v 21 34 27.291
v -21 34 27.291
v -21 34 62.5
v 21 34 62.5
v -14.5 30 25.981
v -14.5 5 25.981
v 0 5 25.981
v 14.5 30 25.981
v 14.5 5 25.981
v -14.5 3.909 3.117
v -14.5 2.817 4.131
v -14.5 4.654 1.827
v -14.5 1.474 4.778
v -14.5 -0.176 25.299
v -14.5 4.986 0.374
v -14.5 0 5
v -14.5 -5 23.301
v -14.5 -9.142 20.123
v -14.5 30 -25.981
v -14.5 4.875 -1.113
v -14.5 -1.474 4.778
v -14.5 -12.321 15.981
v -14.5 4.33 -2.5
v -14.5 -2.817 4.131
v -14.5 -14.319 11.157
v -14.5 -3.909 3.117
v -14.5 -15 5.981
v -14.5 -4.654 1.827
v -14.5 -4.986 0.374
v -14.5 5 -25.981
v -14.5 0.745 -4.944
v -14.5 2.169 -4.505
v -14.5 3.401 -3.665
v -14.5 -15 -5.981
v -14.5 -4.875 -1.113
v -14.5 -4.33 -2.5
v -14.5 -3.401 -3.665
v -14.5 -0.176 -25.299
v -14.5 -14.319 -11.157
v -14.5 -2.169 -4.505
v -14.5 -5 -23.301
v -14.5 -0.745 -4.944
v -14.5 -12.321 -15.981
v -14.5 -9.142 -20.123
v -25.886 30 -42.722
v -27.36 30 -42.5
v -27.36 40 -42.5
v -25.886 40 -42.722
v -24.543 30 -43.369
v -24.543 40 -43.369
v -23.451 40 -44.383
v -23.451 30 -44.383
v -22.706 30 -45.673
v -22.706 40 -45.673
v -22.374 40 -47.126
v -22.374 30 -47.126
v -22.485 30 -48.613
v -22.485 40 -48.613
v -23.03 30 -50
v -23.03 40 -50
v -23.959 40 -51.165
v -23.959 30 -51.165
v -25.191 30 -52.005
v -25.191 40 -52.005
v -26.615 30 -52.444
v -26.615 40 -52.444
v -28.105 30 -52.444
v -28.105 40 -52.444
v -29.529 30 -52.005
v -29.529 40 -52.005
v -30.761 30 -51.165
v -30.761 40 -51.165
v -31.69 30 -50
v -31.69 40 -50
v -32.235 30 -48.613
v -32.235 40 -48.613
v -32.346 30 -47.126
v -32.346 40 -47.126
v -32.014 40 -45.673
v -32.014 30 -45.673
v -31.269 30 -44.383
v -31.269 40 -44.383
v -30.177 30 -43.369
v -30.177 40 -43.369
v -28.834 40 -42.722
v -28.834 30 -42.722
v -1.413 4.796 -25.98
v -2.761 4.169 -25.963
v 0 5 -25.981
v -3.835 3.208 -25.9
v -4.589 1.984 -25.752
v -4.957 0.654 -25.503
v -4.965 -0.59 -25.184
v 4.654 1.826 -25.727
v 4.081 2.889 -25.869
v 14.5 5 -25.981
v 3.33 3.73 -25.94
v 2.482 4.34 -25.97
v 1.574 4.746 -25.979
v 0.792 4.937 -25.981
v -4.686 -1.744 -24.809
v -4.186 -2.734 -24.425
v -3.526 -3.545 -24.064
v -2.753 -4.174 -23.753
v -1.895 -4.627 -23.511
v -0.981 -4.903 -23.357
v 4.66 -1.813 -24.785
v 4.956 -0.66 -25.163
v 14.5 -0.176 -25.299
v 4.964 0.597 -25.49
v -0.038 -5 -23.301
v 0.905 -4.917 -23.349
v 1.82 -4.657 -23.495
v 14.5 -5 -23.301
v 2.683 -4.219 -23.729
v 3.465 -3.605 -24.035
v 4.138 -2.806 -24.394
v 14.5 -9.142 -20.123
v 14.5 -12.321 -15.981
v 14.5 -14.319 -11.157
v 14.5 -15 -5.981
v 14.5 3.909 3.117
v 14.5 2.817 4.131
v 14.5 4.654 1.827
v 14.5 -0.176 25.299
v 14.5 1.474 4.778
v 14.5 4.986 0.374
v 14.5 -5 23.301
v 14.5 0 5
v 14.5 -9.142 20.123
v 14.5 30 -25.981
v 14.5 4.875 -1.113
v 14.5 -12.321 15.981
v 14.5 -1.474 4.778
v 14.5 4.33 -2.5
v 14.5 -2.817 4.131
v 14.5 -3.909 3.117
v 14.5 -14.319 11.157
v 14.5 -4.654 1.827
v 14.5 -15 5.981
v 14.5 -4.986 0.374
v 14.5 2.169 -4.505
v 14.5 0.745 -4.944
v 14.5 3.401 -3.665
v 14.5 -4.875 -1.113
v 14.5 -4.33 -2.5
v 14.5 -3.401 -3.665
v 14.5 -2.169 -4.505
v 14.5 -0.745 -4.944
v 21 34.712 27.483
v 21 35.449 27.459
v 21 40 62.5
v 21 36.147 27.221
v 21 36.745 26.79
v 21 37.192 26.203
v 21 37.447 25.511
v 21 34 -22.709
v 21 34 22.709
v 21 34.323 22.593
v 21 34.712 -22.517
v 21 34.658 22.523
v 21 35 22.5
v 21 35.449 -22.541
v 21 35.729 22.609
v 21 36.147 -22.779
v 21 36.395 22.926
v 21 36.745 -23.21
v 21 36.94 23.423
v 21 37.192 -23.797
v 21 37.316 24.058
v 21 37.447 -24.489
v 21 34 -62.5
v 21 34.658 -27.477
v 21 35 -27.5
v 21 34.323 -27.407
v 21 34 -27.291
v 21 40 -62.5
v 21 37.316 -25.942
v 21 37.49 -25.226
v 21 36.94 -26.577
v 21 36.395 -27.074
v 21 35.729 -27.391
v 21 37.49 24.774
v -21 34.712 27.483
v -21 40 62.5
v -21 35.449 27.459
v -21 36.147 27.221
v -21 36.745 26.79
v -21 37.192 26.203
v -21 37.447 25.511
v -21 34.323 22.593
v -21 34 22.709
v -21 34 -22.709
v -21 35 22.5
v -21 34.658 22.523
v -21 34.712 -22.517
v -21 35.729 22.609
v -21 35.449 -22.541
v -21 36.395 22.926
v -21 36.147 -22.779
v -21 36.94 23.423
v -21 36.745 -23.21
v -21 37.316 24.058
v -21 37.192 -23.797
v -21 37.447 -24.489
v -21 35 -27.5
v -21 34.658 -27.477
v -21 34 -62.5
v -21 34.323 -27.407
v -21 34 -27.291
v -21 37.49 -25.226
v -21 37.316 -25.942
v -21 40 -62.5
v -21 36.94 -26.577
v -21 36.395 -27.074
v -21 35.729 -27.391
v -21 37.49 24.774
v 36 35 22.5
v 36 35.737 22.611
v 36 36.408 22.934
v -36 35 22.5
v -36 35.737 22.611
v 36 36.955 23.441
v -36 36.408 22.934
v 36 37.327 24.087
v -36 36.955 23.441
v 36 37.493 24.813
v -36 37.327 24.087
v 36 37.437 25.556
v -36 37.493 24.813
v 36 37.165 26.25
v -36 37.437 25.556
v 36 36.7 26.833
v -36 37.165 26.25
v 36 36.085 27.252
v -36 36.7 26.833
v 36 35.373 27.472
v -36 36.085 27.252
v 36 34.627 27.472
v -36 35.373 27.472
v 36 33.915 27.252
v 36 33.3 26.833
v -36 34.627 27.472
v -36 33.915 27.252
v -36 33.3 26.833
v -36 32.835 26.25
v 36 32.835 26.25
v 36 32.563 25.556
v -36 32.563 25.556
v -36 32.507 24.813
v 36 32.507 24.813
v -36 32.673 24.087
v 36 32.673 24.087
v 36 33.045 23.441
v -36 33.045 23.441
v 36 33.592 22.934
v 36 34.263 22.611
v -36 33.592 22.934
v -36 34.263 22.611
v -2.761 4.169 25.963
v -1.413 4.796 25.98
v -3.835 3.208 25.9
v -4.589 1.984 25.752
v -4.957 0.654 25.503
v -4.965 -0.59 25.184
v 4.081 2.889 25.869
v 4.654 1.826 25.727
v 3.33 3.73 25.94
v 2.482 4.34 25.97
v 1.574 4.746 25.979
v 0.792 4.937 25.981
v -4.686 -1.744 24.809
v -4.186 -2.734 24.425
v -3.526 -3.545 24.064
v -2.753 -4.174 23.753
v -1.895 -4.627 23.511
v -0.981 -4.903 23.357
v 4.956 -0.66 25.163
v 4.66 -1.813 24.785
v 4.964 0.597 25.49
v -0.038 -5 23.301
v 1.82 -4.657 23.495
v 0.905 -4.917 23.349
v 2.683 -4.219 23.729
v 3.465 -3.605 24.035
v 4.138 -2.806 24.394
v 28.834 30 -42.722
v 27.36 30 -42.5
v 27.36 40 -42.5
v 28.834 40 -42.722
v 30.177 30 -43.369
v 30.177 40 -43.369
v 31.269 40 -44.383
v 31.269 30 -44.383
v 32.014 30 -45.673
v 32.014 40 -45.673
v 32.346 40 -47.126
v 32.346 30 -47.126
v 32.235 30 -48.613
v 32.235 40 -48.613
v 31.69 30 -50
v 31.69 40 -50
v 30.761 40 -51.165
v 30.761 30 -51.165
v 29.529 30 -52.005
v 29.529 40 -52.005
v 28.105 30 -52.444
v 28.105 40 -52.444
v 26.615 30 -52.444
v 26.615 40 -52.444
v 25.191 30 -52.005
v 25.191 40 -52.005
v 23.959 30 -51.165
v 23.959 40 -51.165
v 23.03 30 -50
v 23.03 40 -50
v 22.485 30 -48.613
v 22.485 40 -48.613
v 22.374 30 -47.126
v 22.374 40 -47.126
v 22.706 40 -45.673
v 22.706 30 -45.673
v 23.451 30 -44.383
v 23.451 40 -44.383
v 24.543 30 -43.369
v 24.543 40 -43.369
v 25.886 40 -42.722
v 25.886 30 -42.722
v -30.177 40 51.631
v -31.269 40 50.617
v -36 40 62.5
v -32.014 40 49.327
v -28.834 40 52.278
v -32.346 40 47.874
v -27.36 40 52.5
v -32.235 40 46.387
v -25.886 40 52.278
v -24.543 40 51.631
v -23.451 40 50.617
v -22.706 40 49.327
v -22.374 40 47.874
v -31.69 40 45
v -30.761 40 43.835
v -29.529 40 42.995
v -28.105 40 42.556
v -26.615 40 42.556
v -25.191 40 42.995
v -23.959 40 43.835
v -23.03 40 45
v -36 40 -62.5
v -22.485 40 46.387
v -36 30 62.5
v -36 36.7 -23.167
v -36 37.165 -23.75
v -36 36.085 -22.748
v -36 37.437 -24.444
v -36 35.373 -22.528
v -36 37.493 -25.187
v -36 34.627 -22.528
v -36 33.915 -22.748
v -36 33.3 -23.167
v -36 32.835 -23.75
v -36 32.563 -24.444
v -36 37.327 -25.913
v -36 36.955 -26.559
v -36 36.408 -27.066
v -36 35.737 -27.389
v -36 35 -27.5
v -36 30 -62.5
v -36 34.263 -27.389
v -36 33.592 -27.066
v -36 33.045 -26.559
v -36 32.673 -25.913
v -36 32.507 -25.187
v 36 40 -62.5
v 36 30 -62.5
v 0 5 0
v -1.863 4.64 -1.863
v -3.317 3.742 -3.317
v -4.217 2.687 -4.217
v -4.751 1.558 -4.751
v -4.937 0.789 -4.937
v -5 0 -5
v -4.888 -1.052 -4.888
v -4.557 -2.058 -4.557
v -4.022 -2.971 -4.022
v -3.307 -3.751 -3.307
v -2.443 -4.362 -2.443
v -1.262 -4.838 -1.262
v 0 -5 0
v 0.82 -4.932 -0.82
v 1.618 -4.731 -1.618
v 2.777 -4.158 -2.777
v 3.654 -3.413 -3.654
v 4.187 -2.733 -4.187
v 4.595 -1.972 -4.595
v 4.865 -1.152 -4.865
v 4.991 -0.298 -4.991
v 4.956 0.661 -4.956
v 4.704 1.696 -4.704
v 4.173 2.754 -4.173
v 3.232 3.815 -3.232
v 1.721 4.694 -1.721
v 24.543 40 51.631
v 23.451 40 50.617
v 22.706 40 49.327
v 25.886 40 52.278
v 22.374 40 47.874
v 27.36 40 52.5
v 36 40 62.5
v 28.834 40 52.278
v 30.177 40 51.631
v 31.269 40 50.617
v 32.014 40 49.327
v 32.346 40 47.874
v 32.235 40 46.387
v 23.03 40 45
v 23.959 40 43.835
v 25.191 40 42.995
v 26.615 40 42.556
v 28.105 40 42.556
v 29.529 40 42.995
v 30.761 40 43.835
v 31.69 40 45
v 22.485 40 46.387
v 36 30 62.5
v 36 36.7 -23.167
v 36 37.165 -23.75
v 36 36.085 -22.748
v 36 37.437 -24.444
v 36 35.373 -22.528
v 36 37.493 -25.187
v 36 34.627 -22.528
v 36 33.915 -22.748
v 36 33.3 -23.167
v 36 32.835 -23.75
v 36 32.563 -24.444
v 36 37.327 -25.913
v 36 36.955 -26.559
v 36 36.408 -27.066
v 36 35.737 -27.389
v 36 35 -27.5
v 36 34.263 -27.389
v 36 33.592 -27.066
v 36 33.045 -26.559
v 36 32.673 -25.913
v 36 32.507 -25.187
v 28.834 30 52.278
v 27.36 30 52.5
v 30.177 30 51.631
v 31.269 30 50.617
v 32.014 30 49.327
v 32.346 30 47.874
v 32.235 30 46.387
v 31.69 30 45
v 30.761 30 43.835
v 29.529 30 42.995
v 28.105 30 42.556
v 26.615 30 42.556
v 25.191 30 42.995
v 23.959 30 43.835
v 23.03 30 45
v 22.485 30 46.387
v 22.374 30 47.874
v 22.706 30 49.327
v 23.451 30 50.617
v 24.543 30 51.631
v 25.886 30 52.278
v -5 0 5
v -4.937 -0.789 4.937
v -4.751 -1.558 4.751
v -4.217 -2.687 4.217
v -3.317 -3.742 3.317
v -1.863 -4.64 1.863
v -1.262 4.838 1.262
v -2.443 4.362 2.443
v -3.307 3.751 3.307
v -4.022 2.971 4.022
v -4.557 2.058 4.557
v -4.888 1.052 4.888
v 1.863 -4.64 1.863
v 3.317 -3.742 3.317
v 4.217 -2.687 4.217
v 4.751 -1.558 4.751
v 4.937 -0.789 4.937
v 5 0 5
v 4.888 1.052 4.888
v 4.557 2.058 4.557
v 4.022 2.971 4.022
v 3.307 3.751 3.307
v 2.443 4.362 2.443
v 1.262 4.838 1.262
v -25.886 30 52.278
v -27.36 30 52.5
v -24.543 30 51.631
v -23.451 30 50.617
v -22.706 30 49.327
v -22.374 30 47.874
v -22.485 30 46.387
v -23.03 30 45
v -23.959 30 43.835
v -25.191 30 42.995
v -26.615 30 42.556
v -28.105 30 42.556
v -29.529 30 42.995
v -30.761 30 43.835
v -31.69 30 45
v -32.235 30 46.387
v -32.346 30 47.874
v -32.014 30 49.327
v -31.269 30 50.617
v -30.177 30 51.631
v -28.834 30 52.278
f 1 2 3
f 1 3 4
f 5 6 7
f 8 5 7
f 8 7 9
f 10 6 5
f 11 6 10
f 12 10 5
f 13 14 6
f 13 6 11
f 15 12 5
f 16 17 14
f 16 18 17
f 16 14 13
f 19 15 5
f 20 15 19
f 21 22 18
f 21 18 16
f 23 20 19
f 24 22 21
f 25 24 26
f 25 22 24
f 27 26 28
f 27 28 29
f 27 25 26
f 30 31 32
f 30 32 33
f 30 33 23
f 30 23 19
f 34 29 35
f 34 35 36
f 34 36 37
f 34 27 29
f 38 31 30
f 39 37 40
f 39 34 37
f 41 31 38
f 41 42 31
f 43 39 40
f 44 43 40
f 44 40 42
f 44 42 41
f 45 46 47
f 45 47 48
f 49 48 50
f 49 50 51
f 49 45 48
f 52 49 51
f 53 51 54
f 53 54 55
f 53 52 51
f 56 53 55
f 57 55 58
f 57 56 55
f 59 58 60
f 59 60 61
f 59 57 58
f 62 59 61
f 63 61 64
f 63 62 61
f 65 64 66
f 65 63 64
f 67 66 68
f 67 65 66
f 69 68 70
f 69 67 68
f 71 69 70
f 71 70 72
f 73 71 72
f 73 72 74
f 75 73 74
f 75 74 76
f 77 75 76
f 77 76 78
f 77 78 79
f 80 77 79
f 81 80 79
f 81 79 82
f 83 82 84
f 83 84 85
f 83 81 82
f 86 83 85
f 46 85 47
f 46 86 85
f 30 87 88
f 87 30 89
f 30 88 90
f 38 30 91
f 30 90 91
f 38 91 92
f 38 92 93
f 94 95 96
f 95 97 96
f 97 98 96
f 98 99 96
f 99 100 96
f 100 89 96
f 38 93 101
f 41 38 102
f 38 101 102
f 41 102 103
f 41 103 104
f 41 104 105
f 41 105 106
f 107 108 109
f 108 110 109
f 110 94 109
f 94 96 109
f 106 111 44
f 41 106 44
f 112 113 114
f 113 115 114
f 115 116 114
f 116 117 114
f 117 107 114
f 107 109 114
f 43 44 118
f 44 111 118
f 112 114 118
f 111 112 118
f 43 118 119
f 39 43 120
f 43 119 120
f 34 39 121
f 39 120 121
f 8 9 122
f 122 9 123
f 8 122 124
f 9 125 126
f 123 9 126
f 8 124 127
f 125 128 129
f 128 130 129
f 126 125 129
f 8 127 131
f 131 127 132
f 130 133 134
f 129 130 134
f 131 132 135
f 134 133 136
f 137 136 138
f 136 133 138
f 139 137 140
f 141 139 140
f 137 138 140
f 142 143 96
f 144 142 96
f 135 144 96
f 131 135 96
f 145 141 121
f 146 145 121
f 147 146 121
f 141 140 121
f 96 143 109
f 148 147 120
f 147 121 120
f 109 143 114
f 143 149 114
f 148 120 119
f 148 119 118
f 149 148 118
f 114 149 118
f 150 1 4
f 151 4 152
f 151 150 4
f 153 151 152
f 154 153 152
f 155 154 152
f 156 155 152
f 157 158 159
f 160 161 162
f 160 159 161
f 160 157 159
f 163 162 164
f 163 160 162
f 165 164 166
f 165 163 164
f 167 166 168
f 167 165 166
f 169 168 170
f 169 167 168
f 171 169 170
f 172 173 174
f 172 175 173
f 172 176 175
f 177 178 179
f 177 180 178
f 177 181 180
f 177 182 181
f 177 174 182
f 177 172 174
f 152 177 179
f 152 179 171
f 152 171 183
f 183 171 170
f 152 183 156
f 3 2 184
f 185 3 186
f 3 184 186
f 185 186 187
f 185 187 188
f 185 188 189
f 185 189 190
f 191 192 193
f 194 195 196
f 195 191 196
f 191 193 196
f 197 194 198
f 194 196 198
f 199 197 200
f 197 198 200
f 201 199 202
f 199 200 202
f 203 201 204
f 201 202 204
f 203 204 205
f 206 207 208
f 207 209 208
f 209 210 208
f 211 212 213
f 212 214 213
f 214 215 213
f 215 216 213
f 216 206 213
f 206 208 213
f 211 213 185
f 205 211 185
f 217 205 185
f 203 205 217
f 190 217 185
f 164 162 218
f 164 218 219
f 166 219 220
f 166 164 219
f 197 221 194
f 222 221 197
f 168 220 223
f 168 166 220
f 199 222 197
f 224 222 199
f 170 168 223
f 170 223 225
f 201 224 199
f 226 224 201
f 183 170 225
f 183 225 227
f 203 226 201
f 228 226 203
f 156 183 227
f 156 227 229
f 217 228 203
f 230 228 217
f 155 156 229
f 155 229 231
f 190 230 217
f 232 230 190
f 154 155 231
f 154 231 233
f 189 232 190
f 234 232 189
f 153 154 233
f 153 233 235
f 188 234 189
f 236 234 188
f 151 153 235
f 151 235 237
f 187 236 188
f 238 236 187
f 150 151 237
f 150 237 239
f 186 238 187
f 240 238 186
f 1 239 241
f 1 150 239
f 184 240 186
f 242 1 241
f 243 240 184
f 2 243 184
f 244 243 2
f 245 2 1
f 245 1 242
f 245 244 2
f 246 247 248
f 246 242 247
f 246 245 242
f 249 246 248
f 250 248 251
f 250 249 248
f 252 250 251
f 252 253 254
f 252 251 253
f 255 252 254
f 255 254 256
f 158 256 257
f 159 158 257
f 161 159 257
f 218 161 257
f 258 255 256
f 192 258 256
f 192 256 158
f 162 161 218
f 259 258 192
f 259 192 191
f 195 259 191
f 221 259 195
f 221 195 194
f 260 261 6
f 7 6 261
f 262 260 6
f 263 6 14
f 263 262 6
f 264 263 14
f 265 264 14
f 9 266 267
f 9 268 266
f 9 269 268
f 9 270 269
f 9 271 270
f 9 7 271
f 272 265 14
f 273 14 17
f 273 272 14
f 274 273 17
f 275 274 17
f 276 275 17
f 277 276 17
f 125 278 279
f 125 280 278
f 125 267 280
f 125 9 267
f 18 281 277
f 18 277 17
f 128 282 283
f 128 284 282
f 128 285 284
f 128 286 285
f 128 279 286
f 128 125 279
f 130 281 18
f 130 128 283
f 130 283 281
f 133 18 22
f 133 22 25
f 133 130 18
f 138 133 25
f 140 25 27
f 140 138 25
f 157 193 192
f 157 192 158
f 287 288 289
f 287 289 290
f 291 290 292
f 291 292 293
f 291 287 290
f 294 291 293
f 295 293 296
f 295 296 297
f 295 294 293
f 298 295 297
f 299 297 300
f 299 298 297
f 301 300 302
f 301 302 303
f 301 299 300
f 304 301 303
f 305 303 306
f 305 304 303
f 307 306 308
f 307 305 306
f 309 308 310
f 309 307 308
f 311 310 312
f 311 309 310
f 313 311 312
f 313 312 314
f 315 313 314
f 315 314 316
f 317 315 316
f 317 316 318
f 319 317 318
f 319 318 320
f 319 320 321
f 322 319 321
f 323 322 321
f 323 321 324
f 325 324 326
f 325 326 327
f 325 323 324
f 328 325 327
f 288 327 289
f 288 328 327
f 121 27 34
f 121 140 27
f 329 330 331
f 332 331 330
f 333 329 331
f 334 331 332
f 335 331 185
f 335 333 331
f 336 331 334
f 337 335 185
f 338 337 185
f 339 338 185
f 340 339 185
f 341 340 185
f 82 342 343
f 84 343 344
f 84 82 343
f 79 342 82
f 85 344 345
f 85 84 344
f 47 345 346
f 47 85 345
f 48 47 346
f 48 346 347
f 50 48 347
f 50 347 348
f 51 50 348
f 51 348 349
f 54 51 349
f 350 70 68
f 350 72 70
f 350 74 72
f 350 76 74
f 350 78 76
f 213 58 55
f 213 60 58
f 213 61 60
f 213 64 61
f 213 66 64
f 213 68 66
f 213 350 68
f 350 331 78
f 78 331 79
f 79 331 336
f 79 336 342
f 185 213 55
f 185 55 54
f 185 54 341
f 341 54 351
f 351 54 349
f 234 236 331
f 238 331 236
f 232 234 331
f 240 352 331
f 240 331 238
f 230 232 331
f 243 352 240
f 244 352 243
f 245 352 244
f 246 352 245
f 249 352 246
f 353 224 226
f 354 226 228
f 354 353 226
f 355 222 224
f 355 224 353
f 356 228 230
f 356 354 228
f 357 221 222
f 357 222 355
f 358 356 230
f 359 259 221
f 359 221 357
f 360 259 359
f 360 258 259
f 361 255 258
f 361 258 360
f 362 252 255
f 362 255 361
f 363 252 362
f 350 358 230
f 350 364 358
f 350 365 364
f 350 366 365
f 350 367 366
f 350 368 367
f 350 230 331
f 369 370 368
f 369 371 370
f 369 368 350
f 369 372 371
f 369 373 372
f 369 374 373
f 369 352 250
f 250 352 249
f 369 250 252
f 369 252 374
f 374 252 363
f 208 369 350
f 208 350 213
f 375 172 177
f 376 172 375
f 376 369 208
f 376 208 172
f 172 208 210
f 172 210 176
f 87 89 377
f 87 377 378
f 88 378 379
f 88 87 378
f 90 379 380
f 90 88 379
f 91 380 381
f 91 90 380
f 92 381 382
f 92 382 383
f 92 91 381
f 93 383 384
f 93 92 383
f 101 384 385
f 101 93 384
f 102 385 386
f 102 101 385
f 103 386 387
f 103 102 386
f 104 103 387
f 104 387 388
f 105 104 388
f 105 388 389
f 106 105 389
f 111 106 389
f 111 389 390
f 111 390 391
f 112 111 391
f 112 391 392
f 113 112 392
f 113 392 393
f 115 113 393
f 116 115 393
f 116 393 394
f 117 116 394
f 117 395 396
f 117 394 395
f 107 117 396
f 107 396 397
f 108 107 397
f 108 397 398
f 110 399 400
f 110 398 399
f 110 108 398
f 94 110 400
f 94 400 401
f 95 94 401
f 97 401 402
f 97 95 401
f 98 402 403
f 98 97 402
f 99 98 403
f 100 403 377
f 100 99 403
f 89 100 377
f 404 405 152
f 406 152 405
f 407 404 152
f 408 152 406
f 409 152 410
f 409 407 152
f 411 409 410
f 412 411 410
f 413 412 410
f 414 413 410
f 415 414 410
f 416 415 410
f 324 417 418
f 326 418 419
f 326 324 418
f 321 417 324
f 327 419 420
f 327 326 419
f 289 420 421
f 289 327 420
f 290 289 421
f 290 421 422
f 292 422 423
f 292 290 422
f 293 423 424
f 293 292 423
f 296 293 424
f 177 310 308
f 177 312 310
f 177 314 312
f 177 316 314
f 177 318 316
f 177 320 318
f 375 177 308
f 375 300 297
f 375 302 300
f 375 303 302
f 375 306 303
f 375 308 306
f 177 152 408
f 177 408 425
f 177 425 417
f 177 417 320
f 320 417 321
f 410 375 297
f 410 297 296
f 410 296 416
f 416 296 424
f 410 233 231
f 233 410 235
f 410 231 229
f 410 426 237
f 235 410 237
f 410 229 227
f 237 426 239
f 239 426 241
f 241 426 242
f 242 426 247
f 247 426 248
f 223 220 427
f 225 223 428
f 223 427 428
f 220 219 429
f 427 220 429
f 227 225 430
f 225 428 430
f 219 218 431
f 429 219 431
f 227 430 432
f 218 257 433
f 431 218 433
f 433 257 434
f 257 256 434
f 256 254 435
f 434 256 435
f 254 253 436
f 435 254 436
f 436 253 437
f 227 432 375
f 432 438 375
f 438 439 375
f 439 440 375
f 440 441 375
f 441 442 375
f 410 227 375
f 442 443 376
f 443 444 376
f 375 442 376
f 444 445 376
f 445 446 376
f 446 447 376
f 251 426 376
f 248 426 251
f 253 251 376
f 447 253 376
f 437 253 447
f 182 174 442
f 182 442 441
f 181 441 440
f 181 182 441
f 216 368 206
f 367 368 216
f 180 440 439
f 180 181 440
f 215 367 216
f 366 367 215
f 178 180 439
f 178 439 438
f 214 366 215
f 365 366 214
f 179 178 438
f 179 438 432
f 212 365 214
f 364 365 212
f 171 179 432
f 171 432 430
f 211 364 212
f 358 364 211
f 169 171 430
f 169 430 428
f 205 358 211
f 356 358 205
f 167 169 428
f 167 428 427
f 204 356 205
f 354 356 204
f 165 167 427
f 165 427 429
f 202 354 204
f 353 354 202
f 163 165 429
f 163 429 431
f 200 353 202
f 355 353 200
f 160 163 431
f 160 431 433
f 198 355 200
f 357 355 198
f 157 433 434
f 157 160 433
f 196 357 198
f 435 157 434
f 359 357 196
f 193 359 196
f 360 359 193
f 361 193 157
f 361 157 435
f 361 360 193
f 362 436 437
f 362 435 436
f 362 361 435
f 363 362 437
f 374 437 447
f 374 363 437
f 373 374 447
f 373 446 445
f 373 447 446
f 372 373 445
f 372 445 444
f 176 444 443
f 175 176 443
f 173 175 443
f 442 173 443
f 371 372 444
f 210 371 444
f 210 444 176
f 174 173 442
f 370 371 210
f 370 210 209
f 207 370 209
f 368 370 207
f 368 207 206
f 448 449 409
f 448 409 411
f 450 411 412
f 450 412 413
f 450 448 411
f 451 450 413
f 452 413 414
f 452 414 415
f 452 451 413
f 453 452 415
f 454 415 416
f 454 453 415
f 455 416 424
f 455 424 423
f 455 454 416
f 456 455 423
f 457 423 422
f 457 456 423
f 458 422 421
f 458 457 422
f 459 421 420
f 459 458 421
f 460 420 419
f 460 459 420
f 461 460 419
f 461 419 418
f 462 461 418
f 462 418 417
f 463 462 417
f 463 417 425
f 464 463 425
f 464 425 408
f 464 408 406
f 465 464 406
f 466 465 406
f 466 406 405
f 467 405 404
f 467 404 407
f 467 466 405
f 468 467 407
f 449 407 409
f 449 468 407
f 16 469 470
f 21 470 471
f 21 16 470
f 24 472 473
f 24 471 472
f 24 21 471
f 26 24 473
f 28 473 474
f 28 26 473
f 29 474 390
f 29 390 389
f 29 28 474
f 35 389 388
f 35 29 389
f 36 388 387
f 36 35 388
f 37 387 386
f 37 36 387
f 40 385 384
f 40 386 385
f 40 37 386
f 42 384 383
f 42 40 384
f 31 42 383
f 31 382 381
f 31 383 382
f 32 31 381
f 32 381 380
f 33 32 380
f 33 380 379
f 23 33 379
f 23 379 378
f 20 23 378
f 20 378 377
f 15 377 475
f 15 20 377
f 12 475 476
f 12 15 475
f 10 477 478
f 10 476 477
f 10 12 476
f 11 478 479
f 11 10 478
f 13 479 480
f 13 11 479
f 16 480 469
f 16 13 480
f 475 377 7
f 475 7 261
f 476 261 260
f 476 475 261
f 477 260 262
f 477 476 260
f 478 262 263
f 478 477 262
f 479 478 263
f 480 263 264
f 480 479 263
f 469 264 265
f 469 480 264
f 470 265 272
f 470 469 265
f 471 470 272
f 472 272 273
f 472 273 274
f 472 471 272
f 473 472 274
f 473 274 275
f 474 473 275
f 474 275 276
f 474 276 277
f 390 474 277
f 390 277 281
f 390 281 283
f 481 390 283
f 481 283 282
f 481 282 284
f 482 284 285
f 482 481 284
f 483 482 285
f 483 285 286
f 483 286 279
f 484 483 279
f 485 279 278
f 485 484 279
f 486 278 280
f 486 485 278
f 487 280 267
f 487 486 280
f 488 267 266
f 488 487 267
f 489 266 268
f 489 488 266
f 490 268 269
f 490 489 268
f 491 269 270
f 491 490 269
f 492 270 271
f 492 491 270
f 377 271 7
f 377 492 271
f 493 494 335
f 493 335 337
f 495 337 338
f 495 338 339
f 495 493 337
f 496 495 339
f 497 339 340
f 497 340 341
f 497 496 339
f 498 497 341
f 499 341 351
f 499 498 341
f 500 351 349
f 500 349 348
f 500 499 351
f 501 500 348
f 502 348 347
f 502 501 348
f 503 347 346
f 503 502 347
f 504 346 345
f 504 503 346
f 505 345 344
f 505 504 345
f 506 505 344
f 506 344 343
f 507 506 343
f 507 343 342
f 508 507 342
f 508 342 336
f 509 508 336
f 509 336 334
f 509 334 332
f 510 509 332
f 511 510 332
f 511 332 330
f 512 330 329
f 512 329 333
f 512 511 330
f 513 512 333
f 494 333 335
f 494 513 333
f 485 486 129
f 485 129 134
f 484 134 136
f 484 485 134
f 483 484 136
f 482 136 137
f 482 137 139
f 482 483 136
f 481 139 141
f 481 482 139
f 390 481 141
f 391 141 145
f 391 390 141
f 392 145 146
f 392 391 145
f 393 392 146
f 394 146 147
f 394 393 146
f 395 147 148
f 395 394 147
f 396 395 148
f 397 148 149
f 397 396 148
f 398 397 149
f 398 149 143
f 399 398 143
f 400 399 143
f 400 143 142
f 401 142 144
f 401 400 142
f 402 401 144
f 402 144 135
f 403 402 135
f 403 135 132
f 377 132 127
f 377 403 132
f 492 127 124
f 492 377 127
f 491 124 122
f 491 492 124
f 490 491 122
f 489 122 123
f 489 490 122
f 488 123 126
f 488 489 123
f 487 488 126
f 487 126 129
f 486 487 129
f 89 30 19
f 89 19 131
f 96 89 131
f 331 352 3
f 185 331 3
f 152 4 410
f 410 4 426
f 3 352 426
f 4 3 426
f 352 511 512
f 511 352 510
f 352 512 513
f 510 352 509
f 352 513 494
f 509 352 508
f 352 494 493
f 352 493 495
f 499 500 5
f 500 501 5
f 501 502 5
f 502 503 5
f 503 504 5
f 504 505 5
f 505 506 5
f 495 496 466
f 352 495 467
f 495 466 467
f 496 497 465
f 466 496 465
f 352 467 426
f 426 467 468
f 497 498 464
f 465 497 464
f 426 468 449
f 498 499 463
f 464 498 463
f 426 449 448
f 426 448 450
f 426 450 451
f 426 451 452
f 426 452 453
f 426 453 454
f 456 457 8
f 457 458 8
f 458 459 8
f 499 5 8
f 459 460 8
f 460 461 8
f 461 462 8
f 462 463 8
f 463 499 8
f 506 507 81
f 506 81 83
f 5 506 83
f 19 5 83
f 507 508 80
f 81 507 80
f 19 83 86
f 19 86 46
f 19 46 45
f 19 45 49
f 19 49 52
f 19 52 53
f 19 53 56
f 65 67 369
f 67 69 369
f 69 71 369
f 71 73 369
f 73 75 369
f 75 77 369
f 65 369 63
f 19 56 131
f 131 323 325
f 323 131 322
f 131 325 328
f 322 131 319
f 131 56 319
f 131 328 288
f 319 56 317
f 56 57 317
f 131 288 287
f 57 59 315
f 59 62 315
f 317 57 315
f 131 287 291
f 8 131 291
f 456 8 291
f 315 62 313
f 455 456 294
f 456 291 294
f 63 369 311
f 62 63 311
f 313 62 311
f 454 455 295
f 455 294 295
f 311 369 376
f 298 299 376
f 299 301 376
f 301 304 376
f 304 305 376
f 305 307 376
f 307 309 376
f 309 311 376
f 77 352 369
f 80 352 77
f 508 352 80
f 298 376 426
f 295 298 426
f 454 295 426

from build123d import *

# Parameters (mm, degrees)
SKETCH1_W               = 51.961524228
SKETCH1_H               = 30
SKETCH1_R               = 5
BOSS_EXTRUDE1_DEPTH     = 14.5
SKETCH2_W               = 29
SKETCH2_H               = 51.961524228
BOSS_EXTRUDE2_DEPTH     = 15
SKETCH3_W               = 72
SKETCH3_H               = 125
SKETCH3_R               = 5
BOSS_EXTRUDE3_DEPTH     = 10
FILLET1_R               = 20
CUT_EXTRUDE1_DEPTH      = 83.475754013
CUT_EXTRUDE1_DEPTH_BACK = 83.475754013
SKETCH4_R               = 5
CUT_EXTRUDE2_DEPTH      = 137.091880728
CUT_EXTRUDE2_DEPTH_BACK = 137.091880728
SKETCH5_W               = 42
SKETCH5_H               = 6
CUT_EXTRUDE3_DEPTH      = 104.393665183
CUT_EXTRUDE3_DEPTH_BACK = 104.393665183
SKETCH6_R               = 2.5


with BuildPart() as part:
    # Sketch1 → Boss-Extrude1 (new, symmetric)
    with BuildSketch(Plane(origin=(0, 0, 0), x_dir=(0, 0, -1), z_dir=(1, 0, 0))):
        Rectangle(SKETCH1_W, SKETCH1_H)
        with Locations(Location((0, 0, 0), (0, 0, 180))):
            Circle(SKETCH1_R, mode=Mode.SUBTRACT)
    extrude(amount=BOSS_EXTRUDE1_DEPTH, both=True)

    # Sketch2 → Boss-Extrude2 (add)
    with BuildSketch(Plane(origin=(0, 15, 0), x_dir=(1, 0, 0), z_dir=(0, 1, 0))):
        Rectangle(SKETCH2_W, SKETCH2_H)
    extrude(amount=BOSS_EXTRUDE2_DEPTH)

    # Sketch3 → Boss-Extrude3 (add)
    with BuildSketch(Plane(origin=(0, 30, 0), x_dir=(1, 0, 0), z_dir=(0, 1, 0))):
        Rectangle(SKETCH3_W, SKETCH3_H)
        with Locations(Location((-27.36, 47.5, 0), (0, 0, 270))):
            Circle(SKETCH3_R, mode=Mode.SUBTRACT)
        with Locations(Location((27.36, 47.5, 0), (0, 0, 270))):
            Circle(SKETCH3_R, mode=Mode.SUBTRACT)
        with Locations(Location((-27.36, -47.5, 0), (0, 0, 270))):
            Circle(SKETCH3_R, mode=Mode.SUBTRACT)
        with Locations(Location((27.36, -47.5, 0), (0, 0, 270))):
            Circle(SKETCH3_R, mode=Mode.SUBTRACT)
    extrude(amount=BOSS_EXTRUDE3_DEPTH)

    # Fillet1
    fillet1_edges = [part.edges().sort_by_distance(p)[0] for p in [
        (0, -15, 25.980762114),
        (0, -15, -25.980762114),
    ]]
    fillet(fillet1_edges, radius=FILLET1_R)

    # Sketch4 → Cut-Extrude1 (cut, two sides: drawn at the far end of the back side and taken through both)
    with BuildSketch(Plane.XY.offset(-CUT_EXTRUDE1_DEPTH_BACK)):
        with Locations(Location((0, 0, 0), (0, 0, 90))):
            Circle(SKETCH4_R)
    extrude(amount=CUT_EXTRUDE1_DEPTH + CUT_EXTRUDE1_DEPTH_BACK, mode=Mode.SUBTRACT)

    # Sketch5 → Cut-Extrude2 (cut, two sides: drawn at the far end of the back side and taken through both)
    with BuildSketch(Plane.XY.offset(62.5).offset(-CUT_EXTRUDE2_DEPTH_BACK)):
        with Locations((0, 37)):
            Rectangle(SKETCH5_W, SKETCH5_H)
    extrude(amount=CUT_EXTRUDE2_DEPTH + CUT_EXTRUDE2_DEPTH_BACK, mode=Mode.SUBTRACT)

    # Sketch6 → Cut-Extrude3 (cut, two sides: drawn at the far end of the back side and taken through both)
    with BuildSketch(Plane(origin=(36, 0, 0), x_dir=(0, 0, -1), z_dir=(1, 0, 0)).offset(-CUT_EXTRUDE3_DEPTH_BACK)):
        with Locations((-25, 35)):
            Circle(SKETCH6_R)
        with Locations((25, 35)):
            Circle(SKETCH6_R)
    extrude(amount=CUT_EXTRUDE3_DEPTH + CUT_EXTRUDE3_DEPTH_BACK, mode=Mode.SUBTRACT)


solid = part.part
